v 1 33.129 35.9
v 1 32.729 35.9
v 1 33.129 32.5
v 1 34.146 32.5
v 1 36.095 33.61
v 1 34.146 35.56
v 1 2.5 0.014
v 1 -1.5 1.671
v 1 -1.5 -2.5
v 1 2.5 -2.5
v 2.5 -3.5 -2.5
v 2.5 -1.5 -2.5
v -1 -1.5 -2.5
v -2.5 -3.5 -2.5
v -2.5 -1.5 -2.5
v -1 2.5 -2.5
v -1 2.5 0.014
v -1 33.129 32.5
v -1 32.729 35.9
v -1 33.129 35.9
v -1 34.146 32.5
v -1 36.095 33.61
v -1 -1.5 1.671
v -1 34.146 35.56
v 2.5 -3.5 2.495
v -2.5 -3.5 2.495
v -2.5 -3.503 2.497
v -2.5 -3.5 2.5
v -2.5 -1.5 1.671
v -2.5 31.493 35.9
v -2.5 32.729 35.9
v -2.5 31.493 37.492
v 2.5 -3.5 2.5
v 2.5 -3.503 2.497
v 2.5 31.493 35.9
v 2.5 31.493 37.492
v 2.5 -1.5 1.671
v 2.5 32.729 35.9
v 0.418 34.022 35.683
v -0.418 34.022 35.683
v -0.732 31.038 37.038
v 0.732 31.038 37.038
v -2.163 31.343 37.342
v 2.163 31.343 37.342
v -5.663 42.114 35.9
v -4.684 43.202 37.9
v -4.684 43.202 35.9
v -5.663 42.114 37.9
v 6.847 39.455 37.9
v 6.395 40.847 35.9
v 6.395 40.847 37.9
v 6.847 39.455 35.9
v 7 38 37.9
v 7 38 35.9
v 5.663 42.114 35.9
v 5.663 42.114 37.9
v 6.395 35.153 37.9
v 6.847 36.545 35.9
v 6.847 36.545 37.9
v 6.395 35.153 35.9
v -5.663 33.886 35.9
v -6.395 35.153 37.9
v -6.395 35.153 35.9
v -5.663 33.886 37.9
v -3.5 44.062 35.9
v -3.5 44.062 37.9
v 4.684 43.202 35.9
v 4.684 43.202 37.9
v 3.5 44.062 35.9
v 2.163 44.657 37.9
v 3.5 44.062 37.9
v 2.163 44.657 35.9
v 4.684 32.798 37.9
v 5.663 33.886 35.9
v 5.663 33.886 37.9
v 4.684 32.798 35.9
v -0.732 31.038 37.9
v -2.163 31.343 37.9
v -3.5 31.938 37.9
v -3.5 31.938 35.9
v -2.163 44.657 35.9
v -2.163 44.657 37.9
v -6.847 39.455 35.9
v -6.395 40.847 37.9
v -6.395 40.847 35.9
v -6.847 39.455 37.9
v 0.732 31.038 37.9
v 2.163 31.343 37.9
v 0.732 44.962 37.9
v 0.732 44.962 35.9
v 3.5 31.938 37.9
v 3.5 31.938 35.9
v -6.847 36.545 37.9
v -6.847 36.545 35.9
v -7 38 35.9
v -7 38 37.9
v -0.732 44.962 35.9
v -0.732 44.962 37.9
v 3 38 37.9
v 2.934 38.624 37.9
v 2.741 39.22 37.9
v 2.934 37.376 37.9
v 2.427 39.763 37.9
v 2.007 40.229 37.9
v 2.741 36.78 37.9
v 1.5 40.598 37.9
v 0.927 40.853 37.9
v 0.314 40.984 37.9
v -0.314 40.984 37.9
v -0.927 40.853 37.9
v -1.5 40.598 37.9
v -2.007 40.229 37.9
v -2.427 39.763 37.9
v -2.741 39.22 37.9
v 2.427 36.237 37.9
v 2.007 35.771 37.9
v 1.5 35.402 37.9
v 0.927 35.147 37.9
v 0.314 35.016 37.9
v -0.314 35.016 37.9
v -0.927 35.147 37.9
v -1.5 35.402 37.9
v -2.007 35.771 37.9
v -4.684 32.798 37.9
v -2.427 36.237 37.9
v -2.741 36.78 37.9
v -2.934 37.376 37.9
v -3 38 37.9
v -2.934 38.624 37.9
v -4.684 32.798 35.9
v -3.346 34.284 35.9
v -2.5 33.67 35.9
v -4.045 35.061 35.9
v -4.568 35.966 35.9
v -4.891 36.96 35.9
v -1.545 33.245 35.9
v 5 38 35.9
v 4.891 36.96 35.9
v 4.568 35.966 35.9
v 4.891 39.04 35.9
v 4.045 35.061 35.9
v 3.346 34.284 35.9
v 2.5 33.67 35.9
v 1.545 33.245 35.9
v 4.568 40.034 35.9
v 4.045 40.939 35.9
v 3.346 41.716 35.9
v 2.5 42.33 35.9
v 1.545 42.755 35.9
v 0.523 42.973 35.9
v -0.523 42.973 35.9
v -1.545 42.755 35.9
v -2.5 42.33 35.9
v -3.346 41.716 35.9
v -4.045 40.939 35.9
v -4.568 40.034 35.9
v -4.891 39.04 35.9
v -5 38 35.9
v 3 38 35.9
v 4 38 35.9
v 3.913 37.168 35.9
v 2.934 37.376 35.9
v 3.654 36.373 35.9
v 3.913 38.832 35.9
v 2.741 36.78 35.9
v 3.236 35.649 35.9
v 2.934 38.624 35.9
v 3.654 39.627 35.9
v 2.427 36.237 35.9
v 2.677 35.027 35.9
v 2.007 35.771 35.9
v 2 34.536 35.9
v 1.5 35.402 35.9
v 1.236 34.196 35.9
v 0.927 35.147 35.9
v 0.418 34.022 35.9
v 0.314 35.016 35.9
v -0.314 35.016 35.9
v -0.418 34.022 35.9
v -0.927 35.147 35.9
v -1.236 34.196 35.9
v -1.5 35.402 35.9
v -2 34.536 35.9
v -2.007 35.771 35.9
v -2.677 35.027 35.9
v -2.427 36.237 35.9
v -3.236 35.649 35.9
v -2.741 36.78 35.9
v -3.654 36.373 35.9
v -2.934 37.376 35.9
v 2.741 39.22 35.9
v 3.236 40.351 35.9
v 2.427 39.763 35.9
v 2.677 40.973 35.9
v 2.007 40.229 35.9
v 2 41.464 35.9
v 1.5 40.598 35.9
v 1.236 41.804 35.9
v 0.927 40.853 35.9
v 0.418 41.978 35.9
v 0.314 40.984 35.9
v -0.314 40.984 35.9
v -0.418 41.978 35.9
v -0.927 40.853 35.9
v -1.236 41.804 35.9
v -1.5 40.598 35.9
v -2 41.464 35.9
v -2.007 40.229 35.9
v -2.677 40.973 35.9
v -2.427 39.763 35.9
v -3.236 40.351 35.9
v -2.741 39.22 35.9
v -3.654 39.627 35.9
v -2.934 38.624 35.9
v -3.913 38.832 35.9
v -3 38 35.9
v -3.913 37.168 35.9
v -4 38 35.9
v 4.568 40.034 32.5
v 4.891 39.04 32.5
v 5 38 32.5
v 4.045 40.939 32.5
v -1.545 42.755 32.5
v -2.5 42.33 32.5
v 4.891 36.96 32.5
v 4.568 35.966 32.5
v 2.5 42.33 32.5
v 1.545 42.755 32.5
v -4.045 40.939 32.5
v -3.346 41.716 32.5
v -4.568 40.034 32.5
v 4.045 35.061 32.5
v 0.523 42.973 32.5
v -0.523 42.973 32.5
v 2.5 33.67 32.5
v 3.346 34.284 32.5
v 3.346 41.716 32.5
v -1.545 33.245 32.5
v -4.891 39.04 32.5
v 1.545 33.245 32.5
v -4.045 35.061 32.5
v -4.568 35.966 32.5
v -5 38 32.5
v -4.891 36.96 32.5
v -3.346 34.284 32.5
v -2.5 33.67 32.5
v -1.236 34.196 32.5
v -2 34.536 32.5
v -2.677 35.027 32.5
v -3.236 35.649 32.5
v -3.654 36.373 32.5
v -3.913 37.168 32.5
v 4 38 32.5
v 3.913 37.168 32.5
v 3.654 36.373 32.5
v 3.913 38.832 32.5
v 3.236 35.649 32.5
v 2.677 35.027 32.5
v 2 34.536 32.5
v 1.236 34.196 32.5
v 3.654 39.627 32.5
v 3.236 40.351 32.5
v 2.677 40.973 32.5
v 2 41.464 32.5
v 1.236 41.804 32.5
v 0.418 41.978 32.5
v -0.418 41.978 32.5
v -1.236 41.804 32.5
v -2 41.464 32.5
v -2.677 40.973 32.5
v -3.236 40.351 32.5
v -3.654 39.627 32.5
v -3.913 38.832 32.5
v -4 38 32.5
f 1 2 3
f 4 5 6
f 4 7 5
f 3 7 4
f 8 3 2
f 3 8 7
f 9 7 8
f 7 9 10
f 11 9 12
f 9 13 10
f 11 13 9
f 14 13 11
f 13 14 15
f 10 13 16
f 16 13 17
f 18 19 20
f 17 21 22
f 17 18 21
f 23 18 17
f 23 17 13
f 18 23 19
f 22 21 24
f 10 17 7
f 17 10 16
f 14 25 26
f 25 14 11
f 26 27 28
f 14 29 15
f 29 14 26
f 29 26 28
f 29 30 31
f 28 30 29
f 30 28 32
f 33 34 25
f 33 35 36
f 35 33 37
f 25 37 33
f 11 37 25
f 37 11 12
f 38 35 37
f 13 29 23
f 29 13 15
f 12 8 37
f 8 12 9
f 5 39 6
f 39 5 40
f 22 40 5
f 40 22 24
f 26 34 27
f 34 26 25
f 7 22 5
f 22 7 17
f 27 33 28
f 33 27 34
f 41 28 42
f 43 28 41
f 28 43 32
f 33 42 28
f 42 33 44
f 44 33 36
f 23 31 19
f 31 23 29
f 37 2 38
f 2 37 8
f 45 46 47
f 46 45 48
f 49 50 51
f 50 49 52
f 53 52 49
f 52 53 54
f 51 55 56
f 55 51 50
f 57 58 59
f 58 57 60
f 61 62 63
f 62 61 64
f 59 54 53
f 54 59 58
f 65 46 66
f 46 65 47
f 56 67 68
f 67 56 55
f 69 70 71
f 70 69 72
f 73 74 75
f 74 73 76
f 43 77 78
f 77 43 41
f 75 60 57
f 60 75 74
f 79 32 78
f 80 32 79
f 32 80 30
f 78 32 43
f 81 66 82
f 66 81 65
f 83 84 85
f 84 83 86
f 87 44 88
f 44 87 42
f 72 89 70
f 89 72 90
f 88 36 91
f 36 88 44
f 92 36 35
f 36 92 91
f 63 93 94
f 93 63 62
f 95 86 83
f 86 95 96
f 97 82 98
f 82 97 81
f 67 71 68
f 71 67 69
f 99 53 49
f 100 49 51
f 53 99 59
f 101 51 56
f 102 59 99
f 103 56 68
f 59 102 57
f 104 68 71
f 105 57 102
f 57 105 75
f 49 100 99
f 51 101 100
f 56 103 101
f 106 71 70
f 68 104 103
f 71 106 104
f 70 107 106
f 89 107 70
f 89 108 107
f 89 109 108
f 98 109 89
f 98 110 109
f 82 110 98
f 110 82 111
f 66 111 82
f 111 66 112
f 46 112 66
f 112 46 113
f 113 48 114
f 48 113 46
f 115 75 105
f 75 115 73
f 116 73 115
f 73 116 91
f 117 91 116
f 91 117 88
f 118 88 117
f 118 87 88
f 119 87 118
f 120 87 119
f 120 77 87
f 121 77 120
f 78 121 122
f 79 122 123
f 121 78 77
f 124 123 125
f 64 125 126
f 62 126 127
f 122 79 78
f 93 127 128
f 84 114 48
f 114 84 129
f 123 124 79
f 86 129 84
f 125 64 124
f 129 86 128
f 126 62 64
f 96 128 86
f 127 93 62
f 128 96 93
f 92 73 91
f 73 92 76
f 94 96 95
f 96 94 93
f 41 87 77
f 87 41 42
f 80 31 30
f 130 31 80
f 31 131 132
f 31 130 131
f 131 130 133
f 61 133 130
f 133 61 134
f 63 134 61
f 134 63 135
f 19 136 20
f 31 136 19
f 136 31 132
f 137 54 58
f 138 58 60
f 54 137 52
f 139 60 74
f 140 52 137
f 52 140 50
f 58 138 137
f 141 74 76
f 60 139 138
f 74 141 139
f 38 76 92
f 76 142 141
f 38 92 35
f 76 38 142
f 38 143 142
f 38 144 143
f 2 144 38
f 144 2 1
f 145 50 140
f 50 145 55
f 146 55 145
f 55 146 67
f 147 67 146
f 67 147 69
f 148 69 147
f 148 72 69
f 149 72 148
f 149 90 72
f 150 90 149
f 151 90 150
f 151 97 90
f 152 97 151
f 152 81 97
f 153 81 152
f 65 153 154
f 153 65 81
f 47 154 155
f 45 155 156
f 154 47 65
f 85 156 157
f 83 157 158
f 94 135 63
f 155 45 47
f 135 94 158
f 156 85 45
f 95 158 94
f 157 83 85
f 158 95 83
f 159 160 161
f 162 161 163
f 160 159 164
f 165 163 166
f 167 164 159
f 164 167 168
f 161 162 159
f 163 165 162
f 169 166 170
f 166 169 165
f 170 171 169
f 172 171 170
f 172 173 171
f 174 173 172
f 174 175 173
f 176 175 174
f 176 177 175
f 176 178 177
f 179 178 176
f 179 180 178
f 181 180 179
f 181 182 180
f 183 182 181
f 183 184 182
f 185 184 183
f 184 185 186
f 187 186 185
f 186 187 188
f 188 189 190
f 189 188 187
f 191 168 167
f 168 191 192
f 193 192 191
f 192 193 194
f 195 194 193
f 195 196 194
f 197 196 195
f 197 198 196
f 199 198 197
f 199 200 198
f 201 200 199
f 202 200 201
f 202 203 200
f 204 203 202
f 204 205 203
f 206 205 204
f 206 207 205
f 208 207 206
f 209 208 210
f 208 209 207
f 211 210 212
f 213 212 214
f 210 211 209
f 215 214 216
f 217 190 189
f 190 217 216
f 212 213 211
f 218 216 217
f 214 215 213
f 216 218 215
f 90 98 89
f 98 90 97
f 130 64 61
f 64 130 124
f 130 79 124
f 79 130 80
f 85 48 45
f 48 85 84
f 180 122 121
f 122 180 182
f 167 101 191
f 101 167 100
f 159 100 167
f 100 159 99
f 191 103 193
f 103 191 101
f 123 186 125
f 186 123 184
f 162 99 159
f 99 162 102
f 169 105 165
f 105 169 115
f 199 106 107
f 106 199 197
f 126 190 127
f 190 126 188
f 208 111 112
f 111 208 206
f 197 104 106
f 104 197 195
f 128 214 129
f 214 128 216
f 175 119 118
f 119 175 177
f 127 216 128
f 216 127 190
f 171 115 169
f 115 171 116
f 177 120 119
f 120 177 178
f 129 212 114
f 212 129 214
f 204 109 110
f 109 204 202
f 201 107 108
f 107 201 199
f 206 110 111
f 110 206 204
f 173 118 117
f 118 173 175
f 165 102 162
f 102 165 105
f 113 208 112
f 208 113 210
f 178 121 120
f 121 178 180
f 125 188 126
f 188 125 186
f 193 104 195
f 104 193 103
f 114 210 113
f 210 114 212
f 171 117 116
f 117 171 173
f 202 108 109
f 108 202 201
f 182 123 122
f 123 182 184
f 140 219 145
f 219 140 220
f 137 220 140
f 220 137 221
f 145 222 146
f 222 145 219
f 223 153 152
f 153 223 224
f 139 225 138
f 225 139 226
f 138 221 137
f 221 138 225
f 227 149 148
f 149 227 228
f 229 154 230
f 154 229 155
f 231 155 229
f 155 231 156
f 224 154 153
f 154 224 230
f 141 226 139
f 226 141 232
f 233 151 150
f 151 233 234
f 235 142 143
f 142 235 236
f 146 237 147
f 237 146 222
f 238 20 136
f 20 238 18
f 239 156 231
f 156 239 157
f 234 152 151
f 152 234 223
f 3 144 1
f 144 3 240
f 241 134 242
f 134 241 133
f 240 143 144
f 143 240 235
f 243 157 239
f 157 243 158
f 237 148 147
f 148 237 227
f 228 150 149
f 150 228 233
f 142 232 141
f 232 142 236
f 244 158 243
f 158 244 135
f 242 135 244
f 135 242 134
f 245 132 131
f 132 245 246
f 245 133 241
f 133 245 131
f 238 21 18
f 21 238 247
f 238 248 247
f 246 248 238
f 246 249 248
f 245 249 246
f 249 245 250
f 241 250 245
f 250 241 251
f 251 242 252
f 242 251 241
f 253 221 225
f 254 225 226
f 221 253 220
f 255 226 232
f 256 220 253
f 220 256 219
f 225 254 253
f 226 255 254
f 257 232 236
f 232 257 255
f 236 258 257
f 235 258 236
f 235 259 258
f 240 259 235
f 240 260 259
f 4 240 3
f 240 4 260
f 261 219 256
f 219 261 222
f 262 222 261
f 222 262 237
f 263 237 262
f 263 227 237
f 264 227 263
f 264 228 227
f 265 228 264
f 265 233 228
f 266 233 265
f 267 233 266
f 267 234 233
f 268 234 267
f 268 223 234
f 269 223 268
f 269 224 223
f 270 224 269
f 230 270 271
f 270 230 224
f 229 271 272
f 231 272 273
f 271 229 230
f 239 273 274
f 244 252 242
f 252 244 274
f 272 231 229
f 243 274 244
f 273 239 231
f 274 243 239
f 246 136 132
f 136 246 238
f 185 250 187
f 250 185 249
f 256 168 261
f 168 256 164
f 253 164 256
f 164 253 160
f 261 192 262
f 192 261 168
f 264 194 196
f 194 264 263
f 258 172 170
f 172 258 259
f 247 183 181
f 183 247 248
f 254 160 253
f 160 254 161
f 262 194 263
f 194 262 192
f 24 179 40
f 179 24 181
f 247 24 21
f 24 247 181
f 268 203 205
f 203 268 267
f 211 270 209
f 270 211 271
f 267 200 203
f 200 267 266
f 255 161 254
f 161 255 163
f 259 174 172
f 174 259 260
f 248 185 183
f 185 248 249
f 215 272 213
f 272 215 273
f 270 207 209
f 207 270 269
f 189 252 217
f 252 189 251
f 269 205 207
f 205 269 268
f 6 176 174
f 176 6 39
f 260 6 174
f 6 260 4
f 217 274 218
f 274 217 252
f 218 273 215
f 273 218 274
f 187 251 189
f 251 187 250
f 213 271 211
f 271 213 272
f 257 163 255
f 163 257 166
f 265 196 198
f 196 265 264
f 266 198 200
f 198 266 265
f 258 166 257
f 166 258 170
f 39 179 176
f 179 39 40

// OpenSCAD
$fn = 30;

//baseCutOut();

//difference(){
//  hexagon(60, 20);
//  baseCutOut(5,5,5);
//}

color("green") Tshape(5,5,5,2); // bottom T
translate([0, 16.65, 17.7]) rotate([-45,0,0]) Tshape(5,5,50,2); // shaft T
//translate([0, 34.35, 34.35]) rotate([-90,0,0]) color("green") Tshape(5,5,5,2); // top T


translate([0, 38, 36.9]) difference() { // ring
  cylinder(d=14, h=2, center=true);
  cylinder(d=6, h=4, center=true);
}

translate([0, 38, 35]) difference() { // support ring
  cylinder(d=10, h=5, center=true);
  cylinder(d=8, h=6, center=true);
}


module Tshape(w,d,h,t){
  cube([t,w,h],center=true);
  translate([0,-2.5,0]) rotate([0,0,90]) cube([t,w,h],center=true);
}

module baseCutOut(){
  // 48 mm Base
  color("RED") cylinder(d=50, h=11, center=true); // Round Base

  // 48 mm hex
  color("RED") translate([0,0,9]) hexagon(50, 12); // Hex base
}

// size is the XY plane size, height in Z
module hexagon(size, height) {
  boxWidth = size/1.75;
  for (r = [-60, 0, 60]) rotate([0,0,r]) cube([boxWidth, size, height], true);
}




//iptables -I INPUT -p tcp --dport 1022 -j ACCEPT
